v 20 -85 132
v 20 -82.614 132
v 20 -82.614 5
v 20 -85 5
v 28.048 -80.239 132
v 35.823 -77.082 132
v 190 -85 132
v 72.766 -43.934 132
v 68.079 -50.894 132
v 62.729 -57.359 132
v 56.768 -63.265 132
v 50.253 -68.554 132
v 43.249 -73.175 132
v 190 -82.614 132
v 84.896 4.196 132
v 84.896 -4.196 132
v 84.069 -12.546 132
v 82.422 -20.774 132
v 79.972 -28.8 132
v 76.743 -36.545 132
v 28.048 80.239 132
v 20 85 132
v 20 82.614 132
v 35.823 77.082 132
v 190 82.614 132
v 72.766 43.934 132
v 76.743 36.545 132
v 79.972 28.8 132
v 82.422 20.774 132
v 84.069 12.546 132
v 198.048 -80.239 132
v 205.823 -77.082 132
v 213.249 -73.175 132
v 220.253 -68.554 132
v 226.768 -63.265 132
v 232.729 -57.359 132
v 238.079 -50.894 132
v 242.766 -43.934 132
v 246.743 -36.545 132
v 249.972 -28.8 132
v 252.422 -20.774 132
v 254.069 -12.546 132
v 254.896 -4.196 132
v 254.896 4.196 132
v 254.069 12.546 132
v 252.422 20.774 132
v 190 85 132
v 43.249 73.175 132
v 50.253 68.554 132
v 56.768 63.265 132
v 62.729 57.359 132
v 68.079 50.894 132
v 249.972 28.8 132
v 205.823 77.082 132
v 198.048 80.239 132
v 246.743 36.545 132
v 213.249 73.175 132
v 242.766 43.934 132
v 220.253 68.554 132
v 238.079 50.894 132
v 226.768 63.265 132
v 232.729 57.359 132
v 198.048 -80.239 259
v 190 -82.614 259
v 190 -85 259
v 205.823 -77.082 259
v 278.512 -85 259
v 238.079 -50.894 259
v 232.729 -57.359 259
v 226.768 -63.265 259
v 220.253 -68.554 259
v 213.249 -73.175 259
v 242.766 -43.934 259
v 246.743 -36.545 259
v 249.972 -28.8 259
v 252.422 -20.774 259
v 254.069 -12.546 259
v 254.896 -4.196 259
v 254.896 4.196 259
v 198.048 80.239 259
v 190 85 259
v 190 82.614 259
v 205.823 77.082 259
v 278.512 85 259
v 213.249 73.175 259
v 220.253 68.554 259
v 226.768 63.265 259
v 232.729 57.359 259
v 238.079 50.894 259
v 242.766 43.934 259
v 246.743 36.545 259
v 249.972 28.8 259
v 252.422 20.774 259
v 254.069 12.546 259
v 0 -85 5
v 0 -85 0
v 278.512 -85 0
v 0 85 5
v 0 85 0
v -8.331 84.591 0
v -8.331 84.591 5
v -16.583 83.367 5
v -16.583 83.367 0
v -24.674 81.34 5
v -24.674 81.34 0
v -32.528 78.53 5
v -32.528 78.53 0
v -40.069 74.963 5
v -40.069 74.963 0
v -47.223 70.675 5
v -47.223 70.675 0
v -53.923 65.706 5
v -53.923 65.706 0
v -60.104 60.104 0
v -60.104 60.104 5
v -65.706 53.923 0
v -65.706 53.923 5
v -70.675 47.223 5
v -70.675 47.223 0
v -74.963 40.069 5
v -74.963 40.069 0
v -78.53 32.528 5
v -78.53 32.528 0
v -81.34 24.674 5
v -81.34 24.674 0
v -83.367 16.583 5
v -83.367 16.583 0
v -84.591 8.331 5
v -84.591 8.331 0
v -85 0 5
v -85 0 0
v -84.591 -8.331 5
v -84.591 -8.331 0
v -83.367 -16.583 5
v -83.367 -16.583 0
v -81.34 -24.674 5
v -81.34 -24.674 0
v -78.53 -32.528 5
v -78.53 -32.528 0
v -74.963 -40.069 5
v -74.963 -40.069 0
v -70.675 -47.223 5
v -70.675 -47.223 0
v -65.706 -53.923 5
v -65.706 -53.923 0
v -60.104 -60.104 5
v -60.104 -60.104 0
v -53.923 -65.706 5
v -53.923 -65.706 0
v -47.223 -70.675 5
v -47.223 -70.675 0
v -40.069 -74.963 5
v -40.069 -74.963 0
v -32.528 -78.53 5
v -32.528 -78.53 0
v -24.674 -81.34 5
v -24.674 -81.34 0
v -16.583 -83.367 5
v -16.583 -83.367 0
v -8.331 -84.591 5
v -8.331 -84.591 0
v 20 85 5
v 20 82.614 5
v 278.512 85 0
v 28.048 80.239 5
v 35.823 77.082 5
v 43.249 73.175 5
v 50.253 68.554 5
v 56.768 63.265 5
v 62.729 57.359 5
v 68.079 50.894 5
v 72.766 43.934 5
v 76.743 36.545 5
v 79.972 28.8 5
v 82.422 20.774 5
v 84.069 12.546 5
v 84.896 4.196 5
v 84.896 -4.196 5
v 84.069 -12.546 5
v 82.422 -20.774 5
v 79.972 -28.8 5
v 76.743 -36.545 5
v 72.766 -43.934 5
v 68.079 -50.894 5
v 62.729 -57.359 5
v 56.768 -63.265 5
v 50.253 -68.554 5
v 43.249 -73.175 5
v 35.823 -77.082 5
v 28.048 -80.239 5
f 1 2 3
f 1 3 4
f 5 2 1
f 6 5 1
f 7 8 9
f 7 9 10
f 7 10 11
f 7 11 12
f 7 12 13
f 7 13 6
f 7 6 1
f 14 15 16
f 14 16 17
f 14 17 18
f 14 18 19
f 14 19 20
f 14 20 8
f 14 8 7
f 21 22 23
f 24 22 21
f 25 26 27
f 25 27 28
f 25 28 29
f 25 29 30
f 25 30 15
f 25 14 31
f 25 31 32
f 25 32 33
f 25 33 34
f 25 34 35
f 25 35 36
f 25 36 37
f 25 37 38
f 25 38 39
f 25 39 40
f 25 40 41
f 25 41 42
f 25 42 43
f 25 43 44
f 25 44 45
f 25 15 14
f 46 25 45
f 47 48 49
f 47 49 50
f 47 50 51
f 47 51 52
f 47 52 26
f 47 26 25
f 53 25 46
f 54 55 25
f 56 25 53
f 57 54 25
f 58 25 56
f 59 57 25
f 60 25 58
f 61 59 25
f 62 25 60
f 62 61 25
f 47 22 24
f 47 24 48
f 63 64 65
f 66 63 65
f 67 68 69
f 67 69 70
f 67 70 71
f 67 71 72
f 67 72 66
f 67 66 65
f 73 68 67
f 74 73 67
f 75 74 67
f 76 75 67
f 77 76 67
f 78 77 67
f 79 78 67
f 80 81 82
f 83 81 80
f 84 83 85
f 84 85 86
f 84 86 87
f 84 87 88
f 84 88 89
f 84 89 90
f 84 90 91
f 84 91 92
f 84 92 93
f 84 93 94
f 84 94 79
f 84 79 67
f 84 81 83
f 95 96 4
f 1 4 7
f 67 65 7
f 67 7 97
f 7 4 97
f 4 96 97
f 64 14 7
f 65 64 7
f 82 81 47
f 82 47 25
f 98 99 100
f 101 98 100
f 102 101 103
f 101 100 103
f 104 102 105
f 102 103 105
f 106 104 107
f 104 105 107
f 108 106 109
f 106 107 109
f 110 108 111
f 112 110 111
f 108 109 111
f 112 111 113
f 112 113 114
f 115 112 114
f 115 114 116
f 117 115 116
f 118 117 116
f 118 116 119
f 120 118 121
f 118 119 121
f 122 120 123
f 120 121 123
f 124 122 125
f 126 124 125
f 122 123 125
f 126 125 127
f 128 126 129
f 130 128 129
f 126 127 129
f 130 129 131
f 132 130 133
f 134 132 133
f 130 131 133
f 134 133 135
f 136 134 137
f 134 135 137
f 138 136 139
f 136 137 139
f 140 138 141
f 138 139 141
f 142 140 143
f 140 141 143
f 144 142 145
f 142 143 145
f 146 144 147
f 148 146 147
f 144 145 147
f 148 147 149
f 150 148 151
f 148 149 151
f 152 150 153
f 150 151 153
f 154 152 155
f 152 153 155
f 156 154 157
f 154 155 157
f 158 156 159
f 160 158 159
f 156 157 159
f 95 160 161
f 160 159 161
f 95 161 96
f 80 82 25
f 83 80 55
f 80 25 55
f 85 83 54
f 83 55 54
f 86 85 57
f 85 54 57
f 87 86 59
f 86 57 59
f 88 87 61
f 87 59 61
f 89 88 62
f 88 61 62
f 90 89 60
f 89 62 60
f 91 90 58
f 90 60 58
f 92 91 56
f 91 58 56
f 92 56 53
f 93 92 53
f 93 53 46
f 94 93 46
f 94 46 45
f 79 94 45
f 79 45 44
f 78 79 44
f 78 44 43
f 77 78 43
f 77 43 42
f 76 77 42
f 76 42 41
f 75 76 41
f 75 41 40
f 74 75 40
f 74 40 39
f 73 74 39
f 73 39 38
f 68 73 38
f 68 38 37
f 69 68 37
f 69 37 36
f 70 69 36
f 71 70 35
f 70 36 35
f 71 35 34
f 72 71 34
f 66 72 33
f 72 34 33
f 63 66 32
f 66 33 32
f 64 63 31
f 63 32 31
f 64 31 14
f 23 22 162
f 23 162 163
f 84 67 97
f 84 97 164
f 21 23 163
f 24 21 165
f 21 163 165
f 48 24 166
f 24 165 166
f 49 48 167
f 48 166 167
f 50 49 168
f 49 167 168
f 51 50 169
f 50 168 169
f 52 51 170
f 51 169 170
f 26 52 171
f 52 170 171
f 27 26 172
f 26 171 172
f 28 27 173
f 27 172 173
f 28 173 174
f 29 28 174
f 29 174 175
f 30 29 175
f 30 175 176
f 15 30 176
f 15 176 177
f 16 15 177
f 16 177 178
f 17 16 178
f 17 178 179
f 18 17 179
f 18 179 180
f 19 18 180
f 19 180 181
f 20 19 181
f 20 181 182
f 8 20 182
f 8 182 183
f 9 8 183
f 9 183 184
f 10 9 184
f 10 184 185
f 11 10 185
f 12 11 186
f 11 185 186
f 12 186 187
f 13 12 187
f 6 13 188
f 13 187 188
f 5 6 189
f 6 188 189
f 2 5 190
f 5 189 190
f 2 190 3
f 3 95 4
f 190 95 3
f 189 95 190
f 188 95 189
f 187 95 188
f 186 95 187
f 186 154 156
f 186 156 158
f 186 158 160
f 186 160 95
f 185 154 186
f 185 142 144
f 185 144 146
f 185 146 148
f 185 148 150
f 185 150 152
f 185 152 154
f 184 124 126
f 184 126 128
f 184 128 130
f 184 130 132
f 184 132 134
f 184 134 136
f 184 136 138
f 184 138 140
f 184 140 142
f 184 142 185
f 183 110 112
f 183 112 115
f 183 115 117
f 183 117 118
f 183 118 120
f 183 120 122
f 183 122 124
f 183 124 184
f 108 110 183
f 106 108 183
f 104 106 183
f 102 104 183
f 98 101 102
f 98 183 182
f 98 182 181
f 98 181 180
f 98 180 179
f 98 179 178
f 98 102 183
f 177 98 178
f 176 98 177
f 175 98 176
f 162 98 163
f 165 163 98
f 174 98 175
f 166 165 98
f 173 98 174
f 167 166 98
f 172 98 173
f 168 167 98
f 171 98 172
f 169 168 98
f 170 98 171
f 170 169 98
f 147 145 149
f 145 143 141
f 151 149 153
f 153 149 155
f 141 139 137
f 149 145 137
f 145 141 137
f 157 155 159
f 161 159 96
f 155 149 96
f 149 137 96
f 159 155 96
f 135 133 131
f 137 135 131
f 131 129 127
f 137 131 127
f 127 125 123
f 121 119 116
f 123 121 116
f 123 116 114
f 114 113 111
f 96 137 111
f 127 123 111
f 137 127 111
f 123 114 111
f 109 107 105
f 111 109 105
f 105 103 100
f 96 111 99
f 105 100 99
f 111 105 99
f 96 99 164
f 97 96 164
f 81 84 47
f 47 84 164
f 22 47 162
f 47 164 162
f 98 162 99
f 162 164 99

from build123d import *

# Parameters (mm, degrees)
F1_DEPTH = 5
F2_DEPTH = 5
F3_DEPTH = 132
F4_DEPTH = 132
F5_DEPTH = 259


with BuildPart() as f1:
    # F0 (on Top) → F1 (new body)
    with BuildSketch(Plane.XY):
        with BuildLine():
            ThreePointArc((20, -82.6135582093), (66.8019460794, -52.5594901041), (85, 0))
            ThreePointArc((85, 0), (66.8019460794, 52.5594901041), (20, 82.6135582093))
            ThreePointArc((20, 82.6135582093), (10.0709372009, 84.4012809375), (0, 85))
            ThreePointArc((0, 85), (-85, 0), (0, -85))
            ThreePointArc((0, -85), (10.0709372009, -84.4012809375), (20, -82.6135582093))
        make_face()
    extrude(amount=F1_DEPTH)

    # F0 (on Top) → F2 (join)
    with BuildSketch(Plane.XY):
        with BuildLine():
            ThreePointArc((0, 85), (10.0709372009, 84.4012809375), (20, 82.6135582093))
            Line((20, 82.6135582093), (20, 85))
            Line((20, 85), (0, 85))
        make_face()
        with BuildLine():
            Line((20, -85), (20, -82.6135582093))
            ThreePointArc((20, -82.6135582093), (10.0709372009, -84.4012809375), (0, -85))
            Line((0, -85), (20, -85))
        make_face()
    extrude(amount=F2_DEPTH)

    # F0 (on Top) → F3 (join)
    with BuildSketch(Plane.XY):
        with BuildLine():
            ThreePointArc((170, -85), (109.8959235991, -60.1040764009), (85, 0))
            ThreePointArc((85, 0), (66.8019460794, -52.5594901041), (20, -82.6135582093))
            Line((20, -82.6135582093), (20, -85))
            Line((20, -85), (170, -85))
        make_face()
        with BuildLine():
            ThreePointArc((20, 82.6135582093), (66.8019460794, 52.5594901041), (85, 0))
            ThreePointArc((85, 0), (109.8959235991, 60.1040764009), (170, 85))
            Line((170, 85), (20, 85))
            Line((20, 85), (20, 82.6135582093))
        make_face()
        with BuildLine():
            ThreePointArc((170, 85), (109.8959235991, 60.1040764009), (85, 0))
            ThreePointArc((85, 0), (109.8959235991, -60.1040764009), (170, -85))
            ThreePointArc((170, -85), (180.0709372009, -84.4012809375), (190, -82.6135582093))
            ThreePointArc((190, -82.6135582093), (236.8019460794, -52.5594901041), (255, 0))
            ThreePointArc((255, 0), (236.8019460794, 52.5594901041), (190, 82.6135582093))
            ThreePointArc((190, 82.6135582093), (180.0709372009, 84.4012809375), (170, 85))
        make_face()
    extrude(amount=F3_DEPTH)

    # F0 (on Top) → F4 (join)
    with BuildSketch(Plane.XY):
        with BuildLine():
            Line((190, 85), (170, 85))
            ThreePointArc((170, 85), (180.0709372009, 84.4012809375), (190, 82.6135582093))
            Line((190, 82.6135582093), (190, 85))
        make_face()
        with BuildLine():
            ThreePointArc((190, -82.6135582093), (180.0709372009, -84.4012809375), (170, -85))
            Line((170, -85), (190, -85))
            Line((190, -85), (190, -82.6135582093))
        make_face()
    extrude(amount=F4_DEPTH)

    # F0 (on Top) → F5 (join)
    with BuildSketch(Plane.XY):
        with BuildLine():
            Line((248.512, 85), (190, 85))
            Line((190, 85), (190, 82.6135582093))
            ThreePointArc((190, 82.6135582093), (236.8019460794, 52.5594901041), (255, 0))
            ThreePointArc((255, 0), (236.8019460794, -52.5594901041), (190, -82.6135582093))
            Line((190, -82.6135582093), (190, -85))
            Line((190, -85), (248.512, -85))
            Line((248.512, -85), (278.512, -85))
            Line((278.512, -85), (278.512, 85))
            Line((278.512, 85), (248.512, 85))
        make_face()
    extrude(amount=F5_DEPTH)


solid = f1.part
